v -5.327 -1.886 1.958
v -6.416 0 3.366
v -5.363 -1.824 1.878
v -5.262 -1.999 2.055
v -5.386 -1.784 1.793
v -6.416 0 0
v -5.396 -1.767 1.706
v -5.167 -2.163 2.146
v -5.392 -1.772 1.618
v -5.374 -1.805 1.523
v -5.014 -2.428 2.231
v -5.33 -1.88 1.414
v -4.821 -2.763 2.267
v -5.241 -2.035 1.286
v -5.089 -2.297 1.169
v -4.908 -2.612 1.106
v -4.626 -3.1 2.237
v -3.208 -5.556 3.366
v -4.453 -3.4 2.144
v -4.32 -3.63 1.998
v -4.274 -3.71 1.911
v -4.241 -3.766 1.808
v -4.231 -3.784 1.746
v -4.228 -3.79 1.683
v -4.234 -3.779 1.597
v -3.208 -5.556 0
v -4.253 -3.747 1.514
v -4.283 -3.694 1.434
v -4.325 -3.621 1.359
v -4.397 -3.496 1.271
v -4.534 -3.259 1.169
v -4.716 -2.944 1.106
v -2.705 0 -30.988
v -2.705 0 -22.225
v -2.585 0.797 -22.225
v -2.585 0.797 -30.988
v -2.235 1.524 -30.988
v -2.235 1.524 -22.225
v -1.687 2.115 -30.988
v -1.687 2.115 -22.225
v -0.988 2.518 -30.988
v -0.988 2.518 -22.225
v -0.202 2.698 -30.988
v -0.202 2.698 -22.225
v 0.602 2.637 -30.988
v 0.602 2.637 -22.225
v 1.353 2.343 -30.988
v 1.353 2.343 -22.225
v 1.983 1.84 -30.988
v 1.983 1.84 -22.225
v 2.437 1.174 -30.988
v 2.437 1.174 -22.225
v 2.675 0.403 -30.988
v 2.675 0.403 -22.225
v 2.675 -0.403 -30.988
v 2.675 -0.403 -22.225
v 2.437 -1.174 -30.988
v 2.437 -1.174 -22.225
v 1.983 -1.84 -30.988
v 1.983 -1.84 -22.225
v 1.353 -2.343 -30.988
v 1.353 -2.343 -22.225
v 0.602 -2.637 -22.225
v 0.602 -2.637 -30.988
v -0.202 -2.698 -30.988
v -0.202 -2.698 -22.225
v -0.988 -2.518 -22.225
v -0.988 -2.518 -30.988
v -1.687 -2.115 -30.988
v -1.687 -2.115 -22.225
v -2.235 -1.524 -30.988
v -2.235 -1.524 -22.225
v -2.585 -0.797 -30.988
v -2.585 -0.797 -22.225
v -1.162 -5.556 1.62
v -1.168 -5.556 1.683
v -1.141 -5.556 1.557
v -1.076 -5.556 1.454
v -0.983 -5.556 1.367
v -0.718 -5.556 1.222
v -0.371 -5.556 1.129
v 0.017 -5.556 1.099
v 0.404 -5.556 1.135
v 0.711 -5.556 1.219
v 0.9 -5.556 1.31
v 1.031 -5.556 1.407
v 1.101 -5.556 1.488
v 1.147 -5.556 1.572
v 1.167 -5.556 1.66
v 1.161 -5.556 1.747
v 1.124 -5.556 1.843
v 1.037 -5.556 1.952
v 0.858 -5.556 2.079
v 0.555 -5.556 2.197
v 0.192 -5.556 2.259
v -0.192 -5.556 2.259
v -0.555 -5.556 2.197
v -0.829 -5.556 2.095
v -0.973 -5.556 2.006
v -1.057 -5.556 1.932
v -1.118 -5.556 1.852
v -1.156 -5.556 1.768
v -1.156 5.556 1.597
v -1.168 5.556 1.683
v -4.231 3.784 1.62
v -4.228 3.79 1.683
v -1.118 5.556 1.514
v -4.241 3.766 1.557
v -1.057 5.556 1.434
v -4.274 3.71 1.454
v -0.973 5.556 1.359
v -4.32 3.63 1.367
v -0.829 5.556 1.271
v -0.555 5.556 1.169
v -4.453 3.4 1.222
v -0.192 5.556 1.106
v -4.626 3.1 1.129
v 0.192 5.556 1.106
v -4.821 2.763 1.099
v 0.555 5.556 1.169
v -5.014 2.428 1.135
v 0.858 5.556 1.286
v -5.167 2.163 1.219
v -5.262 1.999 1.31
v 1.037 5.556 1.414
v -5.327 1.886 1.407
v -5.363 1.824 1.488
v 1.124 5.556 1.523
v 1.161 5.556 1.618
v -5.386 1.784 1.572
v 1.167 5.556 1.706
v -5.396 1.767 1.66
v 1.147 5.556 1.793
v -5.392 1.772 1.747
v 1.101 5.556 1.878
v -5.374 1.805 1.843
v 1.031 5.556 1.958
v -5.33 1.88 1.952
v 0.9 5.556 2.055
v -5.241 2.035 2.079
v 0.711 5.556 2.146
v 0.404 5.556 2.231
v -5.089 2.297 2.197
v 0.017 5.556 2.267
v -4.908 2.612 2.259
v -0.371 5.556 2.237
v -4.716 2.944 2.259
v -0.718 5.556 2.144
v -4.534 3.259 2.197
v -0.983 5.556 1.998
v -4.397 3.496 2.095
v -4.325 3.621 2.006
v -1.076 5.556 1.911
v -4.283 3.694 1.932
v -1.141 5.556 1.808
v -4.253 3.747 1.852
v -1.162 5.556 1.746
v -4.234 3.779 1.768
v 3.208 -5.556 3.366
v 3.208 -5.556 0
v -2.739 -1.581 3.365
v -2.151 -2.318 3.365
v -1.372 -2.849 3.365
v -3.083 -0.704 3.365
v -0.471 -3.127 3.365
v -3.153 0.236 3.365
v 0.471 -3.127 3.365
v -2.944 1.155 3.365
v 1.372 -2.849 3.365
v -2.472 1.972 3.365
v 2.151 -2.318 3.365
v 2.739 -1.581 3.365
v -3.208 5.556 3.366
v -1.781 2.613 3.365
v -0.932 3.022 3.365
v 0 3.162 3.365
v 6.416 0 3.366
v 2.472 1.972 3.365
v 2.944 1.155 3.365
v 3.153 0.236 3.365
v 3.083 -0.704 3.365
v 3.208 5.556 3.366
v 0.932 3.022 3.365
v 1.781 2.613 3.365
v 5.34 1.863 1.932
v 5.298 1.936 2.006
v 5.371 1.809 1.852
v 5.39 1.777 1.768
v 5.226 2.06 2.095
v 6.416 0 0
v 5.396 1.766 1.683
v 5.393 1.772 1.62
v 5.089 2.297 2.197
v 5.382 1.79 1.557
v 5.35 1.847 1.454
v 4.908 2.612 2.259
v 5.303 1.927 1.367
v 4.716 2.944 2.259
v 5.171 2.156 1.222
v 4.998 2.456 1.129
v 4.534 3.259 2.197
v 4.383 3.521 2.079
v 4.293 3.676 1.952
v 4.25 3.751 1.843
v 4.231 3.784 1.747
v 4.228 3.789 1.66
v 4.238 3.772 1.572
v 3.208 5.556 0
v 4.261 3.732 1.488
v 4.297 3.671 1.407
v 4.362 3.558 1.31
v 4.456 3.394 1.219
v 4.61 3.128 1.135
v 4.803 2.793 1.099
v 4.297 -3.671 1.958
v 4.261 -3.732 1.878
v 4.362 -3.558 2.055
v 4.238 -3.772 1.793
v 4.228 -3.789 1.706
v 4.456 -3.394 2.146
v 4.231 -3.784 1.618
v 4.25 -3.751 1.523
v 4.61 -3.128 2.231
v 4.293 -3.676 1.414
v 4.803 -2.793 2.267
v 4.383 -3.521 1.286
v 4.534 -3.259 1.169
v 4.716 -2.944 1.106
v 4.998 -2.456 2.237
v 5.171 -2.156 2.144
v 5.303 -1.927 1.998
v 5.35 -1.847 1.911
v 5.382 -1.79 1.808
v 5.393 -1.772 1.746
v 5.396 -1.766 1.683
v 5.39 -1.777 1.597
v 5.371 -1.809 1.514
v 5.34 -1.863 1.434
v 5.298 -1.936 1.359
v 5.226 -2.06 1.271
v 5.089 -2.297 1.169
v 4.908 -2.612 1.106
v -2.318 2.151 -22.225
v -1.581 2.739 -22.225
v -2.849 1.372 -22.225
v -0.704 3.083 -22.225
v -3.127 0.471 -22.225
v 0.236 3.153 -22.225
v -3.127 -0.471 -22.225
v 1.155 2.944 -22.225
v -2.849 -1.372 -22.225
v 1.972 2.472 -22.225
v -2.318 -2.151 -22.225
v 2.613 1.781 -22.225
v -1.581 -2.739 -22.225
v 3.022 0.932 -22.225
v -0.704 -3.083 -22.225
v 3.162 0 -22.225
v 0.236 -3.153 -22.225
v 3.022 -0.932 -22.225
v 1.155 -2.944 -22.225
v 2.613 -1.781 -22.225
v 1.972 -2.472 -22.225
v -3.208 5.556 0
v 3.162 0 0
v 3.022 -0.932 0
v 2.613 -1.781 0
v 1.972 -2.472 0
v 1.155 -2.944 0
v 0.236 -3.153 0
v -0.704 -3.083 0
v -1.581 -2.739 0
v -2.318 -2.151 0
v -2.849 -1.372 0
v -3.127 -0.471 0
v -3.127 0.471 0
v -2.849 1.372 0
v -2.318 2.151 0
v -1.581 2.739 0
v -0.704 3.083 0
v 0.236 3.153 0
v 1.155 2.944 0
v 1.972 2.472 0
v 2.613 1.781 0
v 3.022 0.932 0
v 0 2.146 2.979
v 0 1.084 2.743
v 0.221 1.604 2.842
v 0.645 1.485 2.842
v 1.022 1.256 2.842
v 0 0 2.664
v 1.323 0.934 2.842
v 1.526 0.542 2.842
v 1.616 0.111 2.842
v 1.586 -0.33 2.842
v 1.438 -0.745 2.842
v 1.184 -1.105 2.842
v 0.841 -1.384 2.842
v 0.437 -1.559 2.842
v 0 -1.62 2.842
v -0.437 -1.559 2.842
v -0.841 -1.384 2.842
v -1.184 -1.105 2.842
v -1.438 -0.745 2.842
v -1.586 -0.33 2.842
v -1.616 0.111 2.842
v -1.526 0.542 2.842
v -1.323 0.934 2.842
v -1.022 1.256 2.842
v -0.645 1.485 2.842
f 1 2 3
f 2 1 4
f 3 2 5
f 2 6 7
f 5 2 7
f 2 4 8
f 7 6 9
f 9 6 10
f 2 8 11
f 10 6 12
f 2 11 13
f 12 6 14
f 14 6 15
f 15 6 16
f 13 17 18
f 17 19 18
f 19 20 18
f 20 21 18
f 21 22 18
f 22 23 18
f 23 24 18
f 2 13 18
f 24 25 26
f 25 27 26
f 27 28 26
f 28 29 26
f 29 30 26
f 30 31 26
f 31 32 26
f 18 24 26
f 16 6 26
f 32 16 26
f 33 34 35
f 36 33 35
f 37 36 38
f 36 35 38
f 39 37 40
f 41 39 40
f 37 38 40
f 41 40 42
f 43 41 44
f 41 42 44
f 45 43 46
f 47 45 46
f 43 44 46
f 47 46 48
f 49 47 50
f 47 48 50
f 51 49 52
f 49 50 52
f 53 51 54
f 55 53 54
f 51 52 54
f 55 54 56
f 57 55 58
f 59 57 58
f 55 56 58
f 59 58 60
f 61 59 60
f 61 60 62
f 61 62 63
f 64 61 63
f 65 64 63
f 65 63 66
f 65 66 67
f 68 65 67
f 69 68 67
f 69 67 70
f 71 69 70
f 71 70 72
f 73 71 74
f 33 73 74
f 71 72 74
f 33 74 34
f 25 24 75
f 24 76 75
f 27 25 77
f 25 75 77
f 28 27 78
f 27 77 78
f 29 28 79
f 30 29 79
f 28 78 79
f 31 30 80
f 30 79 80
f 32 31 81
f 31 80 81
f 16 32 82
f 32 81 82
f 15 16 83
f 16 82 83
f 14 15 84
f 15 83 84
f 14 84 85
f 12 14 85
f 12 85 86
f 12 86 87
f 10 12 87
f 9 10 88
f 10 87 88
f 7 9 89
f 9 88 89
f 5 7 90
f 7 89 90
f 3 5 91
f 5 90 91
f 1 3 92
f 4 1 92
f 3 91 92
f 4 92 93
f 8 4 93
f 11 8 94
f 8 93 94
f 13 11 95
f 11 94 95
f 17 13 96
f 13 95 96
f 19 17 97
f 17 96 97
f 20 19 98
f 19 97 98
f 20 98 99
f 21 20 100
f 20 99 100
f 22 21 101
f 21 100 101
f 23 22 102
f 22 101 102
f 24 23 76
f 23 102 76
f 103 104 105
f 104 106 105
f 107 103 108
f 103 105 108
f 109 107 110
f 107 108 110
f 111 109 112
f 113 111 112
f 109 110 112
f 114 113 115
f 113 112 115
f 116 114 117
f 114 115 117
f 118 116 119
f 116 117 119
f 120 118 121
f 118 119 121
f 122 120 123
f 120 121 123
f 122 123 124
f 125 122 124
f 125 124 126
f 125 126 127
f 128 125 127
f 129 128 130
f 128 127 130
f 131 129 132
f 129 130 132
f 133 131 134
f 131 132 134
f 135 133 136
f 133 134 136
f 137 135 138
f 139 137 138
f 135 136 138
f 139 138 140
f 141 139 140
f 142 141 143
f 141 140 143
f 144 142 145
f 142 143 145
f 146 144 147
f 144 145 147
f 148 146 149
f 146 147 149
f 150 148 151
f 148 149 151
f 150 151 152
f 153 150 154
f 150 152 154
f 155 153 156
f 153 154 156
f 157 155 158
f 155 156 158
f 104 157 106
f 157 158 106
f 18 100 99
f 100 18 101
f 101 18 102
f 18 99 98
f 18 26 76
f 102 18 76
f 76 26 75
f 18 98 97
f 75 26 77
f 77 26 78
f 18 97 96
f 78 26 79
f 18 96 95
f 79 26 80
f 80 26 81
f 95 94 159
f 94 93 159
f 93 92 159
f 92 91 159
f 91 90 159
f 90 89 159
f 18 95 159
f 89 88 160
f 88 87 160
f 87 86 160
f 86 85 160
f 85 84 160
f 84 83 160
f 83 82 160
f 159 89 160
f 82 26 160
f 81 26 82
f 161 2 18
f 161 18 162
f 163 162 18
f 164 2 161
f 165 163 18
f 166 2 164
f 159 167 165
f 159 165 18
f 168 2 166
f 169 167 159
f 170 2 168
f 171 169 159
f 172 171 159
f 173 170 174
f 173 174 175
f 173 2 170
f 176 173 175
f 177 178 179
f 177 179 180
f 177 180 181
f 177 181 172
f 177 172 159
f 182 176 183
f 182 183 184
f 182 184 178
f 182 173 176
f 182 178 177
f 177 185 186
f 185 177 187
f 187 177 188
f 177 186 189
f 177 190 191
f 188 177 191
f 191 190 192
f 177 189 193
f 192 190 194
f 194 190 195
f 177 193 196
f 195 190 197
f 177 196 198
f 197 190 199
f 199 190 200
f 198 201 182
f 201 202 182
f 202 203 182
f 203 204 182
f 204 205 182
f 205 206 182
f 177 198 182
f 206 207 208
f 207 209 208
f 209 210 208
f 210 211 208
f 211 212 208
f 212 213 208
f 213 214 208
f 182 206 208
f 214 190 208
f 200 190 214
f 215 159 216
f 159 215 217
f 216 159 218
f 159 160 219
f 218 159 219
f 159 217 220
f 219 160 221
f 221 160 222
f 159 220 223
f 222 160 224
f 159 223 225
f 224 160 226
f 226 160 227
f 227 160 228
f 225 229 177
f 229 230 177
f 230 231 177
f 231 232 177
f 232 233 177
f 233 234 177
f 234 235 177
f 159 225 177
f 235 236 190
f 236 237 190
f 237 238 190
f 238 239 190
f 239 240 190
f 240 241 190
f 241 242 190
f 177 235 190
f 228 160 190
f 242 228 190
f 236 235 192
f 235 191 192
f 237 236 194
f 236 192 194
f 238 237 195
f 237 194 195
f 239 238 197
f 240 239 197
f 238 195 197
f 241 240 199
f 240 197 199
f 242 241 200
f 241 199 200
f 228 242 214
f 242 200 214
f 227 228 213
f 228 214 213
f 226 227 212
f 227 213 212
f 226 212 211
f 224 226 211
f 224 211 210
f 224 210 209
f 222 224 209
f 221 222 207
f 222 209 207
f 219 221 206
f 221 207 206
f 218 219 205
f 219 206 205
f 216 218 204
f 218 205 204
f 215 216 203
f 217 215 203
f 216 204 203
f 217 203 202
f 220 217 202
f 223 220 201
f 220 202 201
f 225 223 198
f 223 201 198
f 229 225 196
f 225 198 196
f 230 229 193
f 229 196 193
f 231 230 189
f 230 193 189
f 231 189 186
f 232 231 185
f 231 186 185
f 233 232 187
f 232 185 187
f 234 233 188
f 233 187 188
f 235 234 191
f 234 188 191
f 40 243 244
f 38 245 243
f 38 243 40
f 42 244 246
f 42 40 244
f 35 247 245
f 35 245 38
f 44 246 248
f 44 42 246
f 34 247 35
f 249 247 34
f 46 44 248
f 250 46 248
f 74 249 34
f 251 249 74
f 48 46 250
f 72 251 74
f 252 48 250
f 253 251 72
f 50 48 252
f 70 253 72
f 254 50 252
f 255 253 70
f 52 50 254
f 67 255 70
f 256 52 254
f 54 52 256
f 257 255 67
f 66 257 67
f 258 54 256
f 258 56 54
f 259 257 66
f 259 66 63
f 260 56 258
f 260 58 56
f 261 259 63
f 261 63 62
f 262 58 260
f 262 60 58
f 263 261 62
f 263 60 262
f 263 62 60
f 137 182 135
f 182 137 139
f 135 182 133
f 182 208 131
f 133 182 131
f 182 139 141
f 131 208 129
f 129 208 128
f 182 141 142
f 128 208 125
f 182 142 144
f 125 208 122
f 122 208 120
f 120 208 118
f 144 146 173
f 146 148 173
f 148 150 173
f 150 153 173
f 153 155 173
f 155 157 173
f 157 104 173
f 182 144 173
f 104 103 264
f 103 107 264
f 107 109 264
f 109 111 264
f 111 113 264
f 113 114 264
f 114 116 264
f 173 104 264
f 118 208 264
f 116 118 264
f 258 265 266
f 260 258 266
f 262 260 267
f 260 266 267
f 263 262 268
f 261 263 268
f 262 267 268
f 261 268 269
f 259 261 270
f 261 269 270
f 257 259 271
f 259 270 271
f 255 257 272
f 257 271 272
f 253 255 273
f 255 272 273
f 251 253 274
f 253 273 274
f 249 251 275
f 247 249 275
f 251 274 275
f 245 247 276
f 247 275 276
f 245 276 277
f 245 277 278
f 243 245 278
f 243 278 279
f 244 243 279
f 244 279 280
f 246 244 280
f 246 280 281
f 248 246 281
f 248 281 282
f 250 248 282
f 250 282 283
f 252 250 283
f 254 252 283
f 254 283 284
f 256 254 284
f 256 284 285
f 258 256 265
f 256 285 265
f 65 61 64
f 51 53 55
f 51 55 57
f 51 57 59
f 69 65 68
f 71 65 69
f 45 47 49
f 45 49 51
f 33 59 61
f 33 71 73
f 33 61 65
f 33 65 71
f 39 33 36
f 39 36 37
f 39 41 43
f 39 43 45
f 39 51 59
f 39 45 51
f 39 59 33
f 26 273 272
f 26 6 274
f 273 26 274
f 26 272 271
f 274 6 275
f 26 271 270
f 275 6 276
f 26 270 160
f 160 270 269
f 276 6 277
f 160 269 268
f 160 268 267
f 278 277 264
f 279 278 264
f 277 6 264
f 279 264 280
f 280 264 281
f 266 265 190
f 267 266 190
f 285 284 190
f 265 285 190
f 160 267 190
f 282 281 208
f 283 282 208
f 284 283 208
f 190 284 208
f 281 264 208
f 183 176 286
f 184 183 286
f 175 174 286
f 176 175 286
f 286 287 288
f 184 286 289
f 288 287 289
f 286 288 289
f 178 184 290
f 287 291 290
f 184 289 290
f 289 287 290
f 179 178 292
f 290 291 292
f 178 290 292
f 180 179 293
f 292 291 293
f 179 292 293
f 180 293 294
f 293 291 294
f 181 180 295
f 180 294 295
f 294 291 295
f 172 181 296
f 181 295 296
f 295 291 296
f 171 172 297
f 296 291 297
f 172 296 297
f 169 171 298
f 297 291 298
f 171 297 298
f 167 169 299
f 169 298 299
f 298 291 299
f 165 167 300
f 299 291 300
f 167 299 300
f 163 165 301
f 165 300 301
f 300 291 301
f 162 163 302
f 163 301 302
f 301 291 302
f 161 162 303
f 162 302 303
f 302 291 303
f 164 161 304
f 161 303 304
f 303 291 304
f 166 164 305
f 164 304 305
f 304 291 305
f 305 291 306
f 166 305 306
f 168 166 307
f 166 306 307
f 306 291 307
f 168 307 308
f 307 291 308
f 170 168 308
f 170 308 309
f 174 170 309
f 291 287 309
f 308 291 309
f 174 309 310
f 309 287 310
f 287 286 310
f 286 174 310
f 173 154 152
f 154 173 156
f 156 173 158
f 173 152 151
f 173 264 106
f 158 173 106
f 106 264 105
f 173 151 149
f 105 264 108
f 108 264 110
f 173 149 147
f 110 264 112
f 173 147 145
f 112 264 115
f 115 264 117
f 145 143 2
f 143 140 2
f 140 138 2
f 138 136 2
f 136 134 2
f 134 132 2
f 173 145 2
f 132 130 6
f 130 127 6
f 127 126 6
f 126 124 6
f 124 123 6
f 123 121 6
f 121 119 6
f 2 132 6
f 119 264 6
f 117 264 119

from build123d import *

# Parameters (mm, degrees)
BOSS_EXTRUDE1_DEPTH = 3.3655
SKETCH2_R           = 3.1623
BOSS_EXTRUDE2_DEPTH = 22.225
SKETCH3_R           = 2.7051
BOSS_EXTRUDE3_DEPTH = 8.763
SKETCH5_R           = 0.5842
CUT_EXTRUDE1_DEPTH  = 33.129279639
CIRPATTERN1_COUNT   = 3


with BuildPart() as part:
    # Sketch1 → Boss-Extrude1 (new body)
    with BuildSketch(Plane.XY):
        Polygon((3.207902433, 5.55625), (-3.207902433, 5.55625), (-6.415804866, 0), (-3.207902433, -5.55625), (3.207902433, -5.55625), (6.415804866, 0), align=None)
    extrude(amount=BOSS_EXTRUDE1_DEPTH)

    # Sketch2 → Boss-Extrude2 (add)
    with BuildSketch(Plane(origin=(0, 0, 0), x_dir=(-1, 0, 0), z_dir=(0, 0, -1))):
        Circle(SKETCH2_R)
    extrude(amount=BOSS_EXTRUDE2_DEPTH)

    # Sketch3 → Boss-Extrude3 (add)
    with BuildSketch(Plane(origin=(0, 0, -22.225), x_dir=(-1, 0, 0), z_dir=(0, 0, -1))):
        Circle(SKETCH3_R)
    extrude(amount=BOSS_EXTRUDE3_DEPTH)

    # Sketch4 → Cut-Revolve1 (revolve, cut)
    with BuildSketch(Plane(origin=(0, 0, 0), x_dir=(0, 0, -1), z_dir=(1, 0, 0))):
        with BuildLine():
            Line((-3.3655, 0), (-3.3655, 3.1623))
            ThreePointArc((-3.3655, 3.1623), (-2.841803396, 1.619539554), (-2.664434968, 0))
            Line((-2.664434968, 0), (-3.3655, 0))
        make_face()
    revolve(axis=Axis((0, 0, 3.3655), (0, 0, -1)), mode=Mode.SUBTRACT)

    # Sketch5 → Cut-Extrude1 (cut, symmetric)
    with BuildSketch(Plane(origin=(0, 0, 0), x_dir=(1, 0, 0), z_dir=(0, 1, 0))):
        with Locations((4.81185365, -1.68275)):
            Circle(SKETCH5_R)
    cut_extrude1 = extrude(amount=CUT_EXTRUDE1_DEPTH, both=True, mode=Mode.SUBTRACT)

    # CirPattern1: Cut-Extrude1 ×3 about axis
    cirpattern1_axis = Axis((0, 0, -32.705675), (0, 0, 1))
    for i in range(1, CIRPATTERN1_COUNT):
        add(cut_extrude1.rotate(cirpattern1_axis, i * 360 / CIRPATTERN1_COUNT), mode=Mode.SUBTRACT)


solid = part.part
